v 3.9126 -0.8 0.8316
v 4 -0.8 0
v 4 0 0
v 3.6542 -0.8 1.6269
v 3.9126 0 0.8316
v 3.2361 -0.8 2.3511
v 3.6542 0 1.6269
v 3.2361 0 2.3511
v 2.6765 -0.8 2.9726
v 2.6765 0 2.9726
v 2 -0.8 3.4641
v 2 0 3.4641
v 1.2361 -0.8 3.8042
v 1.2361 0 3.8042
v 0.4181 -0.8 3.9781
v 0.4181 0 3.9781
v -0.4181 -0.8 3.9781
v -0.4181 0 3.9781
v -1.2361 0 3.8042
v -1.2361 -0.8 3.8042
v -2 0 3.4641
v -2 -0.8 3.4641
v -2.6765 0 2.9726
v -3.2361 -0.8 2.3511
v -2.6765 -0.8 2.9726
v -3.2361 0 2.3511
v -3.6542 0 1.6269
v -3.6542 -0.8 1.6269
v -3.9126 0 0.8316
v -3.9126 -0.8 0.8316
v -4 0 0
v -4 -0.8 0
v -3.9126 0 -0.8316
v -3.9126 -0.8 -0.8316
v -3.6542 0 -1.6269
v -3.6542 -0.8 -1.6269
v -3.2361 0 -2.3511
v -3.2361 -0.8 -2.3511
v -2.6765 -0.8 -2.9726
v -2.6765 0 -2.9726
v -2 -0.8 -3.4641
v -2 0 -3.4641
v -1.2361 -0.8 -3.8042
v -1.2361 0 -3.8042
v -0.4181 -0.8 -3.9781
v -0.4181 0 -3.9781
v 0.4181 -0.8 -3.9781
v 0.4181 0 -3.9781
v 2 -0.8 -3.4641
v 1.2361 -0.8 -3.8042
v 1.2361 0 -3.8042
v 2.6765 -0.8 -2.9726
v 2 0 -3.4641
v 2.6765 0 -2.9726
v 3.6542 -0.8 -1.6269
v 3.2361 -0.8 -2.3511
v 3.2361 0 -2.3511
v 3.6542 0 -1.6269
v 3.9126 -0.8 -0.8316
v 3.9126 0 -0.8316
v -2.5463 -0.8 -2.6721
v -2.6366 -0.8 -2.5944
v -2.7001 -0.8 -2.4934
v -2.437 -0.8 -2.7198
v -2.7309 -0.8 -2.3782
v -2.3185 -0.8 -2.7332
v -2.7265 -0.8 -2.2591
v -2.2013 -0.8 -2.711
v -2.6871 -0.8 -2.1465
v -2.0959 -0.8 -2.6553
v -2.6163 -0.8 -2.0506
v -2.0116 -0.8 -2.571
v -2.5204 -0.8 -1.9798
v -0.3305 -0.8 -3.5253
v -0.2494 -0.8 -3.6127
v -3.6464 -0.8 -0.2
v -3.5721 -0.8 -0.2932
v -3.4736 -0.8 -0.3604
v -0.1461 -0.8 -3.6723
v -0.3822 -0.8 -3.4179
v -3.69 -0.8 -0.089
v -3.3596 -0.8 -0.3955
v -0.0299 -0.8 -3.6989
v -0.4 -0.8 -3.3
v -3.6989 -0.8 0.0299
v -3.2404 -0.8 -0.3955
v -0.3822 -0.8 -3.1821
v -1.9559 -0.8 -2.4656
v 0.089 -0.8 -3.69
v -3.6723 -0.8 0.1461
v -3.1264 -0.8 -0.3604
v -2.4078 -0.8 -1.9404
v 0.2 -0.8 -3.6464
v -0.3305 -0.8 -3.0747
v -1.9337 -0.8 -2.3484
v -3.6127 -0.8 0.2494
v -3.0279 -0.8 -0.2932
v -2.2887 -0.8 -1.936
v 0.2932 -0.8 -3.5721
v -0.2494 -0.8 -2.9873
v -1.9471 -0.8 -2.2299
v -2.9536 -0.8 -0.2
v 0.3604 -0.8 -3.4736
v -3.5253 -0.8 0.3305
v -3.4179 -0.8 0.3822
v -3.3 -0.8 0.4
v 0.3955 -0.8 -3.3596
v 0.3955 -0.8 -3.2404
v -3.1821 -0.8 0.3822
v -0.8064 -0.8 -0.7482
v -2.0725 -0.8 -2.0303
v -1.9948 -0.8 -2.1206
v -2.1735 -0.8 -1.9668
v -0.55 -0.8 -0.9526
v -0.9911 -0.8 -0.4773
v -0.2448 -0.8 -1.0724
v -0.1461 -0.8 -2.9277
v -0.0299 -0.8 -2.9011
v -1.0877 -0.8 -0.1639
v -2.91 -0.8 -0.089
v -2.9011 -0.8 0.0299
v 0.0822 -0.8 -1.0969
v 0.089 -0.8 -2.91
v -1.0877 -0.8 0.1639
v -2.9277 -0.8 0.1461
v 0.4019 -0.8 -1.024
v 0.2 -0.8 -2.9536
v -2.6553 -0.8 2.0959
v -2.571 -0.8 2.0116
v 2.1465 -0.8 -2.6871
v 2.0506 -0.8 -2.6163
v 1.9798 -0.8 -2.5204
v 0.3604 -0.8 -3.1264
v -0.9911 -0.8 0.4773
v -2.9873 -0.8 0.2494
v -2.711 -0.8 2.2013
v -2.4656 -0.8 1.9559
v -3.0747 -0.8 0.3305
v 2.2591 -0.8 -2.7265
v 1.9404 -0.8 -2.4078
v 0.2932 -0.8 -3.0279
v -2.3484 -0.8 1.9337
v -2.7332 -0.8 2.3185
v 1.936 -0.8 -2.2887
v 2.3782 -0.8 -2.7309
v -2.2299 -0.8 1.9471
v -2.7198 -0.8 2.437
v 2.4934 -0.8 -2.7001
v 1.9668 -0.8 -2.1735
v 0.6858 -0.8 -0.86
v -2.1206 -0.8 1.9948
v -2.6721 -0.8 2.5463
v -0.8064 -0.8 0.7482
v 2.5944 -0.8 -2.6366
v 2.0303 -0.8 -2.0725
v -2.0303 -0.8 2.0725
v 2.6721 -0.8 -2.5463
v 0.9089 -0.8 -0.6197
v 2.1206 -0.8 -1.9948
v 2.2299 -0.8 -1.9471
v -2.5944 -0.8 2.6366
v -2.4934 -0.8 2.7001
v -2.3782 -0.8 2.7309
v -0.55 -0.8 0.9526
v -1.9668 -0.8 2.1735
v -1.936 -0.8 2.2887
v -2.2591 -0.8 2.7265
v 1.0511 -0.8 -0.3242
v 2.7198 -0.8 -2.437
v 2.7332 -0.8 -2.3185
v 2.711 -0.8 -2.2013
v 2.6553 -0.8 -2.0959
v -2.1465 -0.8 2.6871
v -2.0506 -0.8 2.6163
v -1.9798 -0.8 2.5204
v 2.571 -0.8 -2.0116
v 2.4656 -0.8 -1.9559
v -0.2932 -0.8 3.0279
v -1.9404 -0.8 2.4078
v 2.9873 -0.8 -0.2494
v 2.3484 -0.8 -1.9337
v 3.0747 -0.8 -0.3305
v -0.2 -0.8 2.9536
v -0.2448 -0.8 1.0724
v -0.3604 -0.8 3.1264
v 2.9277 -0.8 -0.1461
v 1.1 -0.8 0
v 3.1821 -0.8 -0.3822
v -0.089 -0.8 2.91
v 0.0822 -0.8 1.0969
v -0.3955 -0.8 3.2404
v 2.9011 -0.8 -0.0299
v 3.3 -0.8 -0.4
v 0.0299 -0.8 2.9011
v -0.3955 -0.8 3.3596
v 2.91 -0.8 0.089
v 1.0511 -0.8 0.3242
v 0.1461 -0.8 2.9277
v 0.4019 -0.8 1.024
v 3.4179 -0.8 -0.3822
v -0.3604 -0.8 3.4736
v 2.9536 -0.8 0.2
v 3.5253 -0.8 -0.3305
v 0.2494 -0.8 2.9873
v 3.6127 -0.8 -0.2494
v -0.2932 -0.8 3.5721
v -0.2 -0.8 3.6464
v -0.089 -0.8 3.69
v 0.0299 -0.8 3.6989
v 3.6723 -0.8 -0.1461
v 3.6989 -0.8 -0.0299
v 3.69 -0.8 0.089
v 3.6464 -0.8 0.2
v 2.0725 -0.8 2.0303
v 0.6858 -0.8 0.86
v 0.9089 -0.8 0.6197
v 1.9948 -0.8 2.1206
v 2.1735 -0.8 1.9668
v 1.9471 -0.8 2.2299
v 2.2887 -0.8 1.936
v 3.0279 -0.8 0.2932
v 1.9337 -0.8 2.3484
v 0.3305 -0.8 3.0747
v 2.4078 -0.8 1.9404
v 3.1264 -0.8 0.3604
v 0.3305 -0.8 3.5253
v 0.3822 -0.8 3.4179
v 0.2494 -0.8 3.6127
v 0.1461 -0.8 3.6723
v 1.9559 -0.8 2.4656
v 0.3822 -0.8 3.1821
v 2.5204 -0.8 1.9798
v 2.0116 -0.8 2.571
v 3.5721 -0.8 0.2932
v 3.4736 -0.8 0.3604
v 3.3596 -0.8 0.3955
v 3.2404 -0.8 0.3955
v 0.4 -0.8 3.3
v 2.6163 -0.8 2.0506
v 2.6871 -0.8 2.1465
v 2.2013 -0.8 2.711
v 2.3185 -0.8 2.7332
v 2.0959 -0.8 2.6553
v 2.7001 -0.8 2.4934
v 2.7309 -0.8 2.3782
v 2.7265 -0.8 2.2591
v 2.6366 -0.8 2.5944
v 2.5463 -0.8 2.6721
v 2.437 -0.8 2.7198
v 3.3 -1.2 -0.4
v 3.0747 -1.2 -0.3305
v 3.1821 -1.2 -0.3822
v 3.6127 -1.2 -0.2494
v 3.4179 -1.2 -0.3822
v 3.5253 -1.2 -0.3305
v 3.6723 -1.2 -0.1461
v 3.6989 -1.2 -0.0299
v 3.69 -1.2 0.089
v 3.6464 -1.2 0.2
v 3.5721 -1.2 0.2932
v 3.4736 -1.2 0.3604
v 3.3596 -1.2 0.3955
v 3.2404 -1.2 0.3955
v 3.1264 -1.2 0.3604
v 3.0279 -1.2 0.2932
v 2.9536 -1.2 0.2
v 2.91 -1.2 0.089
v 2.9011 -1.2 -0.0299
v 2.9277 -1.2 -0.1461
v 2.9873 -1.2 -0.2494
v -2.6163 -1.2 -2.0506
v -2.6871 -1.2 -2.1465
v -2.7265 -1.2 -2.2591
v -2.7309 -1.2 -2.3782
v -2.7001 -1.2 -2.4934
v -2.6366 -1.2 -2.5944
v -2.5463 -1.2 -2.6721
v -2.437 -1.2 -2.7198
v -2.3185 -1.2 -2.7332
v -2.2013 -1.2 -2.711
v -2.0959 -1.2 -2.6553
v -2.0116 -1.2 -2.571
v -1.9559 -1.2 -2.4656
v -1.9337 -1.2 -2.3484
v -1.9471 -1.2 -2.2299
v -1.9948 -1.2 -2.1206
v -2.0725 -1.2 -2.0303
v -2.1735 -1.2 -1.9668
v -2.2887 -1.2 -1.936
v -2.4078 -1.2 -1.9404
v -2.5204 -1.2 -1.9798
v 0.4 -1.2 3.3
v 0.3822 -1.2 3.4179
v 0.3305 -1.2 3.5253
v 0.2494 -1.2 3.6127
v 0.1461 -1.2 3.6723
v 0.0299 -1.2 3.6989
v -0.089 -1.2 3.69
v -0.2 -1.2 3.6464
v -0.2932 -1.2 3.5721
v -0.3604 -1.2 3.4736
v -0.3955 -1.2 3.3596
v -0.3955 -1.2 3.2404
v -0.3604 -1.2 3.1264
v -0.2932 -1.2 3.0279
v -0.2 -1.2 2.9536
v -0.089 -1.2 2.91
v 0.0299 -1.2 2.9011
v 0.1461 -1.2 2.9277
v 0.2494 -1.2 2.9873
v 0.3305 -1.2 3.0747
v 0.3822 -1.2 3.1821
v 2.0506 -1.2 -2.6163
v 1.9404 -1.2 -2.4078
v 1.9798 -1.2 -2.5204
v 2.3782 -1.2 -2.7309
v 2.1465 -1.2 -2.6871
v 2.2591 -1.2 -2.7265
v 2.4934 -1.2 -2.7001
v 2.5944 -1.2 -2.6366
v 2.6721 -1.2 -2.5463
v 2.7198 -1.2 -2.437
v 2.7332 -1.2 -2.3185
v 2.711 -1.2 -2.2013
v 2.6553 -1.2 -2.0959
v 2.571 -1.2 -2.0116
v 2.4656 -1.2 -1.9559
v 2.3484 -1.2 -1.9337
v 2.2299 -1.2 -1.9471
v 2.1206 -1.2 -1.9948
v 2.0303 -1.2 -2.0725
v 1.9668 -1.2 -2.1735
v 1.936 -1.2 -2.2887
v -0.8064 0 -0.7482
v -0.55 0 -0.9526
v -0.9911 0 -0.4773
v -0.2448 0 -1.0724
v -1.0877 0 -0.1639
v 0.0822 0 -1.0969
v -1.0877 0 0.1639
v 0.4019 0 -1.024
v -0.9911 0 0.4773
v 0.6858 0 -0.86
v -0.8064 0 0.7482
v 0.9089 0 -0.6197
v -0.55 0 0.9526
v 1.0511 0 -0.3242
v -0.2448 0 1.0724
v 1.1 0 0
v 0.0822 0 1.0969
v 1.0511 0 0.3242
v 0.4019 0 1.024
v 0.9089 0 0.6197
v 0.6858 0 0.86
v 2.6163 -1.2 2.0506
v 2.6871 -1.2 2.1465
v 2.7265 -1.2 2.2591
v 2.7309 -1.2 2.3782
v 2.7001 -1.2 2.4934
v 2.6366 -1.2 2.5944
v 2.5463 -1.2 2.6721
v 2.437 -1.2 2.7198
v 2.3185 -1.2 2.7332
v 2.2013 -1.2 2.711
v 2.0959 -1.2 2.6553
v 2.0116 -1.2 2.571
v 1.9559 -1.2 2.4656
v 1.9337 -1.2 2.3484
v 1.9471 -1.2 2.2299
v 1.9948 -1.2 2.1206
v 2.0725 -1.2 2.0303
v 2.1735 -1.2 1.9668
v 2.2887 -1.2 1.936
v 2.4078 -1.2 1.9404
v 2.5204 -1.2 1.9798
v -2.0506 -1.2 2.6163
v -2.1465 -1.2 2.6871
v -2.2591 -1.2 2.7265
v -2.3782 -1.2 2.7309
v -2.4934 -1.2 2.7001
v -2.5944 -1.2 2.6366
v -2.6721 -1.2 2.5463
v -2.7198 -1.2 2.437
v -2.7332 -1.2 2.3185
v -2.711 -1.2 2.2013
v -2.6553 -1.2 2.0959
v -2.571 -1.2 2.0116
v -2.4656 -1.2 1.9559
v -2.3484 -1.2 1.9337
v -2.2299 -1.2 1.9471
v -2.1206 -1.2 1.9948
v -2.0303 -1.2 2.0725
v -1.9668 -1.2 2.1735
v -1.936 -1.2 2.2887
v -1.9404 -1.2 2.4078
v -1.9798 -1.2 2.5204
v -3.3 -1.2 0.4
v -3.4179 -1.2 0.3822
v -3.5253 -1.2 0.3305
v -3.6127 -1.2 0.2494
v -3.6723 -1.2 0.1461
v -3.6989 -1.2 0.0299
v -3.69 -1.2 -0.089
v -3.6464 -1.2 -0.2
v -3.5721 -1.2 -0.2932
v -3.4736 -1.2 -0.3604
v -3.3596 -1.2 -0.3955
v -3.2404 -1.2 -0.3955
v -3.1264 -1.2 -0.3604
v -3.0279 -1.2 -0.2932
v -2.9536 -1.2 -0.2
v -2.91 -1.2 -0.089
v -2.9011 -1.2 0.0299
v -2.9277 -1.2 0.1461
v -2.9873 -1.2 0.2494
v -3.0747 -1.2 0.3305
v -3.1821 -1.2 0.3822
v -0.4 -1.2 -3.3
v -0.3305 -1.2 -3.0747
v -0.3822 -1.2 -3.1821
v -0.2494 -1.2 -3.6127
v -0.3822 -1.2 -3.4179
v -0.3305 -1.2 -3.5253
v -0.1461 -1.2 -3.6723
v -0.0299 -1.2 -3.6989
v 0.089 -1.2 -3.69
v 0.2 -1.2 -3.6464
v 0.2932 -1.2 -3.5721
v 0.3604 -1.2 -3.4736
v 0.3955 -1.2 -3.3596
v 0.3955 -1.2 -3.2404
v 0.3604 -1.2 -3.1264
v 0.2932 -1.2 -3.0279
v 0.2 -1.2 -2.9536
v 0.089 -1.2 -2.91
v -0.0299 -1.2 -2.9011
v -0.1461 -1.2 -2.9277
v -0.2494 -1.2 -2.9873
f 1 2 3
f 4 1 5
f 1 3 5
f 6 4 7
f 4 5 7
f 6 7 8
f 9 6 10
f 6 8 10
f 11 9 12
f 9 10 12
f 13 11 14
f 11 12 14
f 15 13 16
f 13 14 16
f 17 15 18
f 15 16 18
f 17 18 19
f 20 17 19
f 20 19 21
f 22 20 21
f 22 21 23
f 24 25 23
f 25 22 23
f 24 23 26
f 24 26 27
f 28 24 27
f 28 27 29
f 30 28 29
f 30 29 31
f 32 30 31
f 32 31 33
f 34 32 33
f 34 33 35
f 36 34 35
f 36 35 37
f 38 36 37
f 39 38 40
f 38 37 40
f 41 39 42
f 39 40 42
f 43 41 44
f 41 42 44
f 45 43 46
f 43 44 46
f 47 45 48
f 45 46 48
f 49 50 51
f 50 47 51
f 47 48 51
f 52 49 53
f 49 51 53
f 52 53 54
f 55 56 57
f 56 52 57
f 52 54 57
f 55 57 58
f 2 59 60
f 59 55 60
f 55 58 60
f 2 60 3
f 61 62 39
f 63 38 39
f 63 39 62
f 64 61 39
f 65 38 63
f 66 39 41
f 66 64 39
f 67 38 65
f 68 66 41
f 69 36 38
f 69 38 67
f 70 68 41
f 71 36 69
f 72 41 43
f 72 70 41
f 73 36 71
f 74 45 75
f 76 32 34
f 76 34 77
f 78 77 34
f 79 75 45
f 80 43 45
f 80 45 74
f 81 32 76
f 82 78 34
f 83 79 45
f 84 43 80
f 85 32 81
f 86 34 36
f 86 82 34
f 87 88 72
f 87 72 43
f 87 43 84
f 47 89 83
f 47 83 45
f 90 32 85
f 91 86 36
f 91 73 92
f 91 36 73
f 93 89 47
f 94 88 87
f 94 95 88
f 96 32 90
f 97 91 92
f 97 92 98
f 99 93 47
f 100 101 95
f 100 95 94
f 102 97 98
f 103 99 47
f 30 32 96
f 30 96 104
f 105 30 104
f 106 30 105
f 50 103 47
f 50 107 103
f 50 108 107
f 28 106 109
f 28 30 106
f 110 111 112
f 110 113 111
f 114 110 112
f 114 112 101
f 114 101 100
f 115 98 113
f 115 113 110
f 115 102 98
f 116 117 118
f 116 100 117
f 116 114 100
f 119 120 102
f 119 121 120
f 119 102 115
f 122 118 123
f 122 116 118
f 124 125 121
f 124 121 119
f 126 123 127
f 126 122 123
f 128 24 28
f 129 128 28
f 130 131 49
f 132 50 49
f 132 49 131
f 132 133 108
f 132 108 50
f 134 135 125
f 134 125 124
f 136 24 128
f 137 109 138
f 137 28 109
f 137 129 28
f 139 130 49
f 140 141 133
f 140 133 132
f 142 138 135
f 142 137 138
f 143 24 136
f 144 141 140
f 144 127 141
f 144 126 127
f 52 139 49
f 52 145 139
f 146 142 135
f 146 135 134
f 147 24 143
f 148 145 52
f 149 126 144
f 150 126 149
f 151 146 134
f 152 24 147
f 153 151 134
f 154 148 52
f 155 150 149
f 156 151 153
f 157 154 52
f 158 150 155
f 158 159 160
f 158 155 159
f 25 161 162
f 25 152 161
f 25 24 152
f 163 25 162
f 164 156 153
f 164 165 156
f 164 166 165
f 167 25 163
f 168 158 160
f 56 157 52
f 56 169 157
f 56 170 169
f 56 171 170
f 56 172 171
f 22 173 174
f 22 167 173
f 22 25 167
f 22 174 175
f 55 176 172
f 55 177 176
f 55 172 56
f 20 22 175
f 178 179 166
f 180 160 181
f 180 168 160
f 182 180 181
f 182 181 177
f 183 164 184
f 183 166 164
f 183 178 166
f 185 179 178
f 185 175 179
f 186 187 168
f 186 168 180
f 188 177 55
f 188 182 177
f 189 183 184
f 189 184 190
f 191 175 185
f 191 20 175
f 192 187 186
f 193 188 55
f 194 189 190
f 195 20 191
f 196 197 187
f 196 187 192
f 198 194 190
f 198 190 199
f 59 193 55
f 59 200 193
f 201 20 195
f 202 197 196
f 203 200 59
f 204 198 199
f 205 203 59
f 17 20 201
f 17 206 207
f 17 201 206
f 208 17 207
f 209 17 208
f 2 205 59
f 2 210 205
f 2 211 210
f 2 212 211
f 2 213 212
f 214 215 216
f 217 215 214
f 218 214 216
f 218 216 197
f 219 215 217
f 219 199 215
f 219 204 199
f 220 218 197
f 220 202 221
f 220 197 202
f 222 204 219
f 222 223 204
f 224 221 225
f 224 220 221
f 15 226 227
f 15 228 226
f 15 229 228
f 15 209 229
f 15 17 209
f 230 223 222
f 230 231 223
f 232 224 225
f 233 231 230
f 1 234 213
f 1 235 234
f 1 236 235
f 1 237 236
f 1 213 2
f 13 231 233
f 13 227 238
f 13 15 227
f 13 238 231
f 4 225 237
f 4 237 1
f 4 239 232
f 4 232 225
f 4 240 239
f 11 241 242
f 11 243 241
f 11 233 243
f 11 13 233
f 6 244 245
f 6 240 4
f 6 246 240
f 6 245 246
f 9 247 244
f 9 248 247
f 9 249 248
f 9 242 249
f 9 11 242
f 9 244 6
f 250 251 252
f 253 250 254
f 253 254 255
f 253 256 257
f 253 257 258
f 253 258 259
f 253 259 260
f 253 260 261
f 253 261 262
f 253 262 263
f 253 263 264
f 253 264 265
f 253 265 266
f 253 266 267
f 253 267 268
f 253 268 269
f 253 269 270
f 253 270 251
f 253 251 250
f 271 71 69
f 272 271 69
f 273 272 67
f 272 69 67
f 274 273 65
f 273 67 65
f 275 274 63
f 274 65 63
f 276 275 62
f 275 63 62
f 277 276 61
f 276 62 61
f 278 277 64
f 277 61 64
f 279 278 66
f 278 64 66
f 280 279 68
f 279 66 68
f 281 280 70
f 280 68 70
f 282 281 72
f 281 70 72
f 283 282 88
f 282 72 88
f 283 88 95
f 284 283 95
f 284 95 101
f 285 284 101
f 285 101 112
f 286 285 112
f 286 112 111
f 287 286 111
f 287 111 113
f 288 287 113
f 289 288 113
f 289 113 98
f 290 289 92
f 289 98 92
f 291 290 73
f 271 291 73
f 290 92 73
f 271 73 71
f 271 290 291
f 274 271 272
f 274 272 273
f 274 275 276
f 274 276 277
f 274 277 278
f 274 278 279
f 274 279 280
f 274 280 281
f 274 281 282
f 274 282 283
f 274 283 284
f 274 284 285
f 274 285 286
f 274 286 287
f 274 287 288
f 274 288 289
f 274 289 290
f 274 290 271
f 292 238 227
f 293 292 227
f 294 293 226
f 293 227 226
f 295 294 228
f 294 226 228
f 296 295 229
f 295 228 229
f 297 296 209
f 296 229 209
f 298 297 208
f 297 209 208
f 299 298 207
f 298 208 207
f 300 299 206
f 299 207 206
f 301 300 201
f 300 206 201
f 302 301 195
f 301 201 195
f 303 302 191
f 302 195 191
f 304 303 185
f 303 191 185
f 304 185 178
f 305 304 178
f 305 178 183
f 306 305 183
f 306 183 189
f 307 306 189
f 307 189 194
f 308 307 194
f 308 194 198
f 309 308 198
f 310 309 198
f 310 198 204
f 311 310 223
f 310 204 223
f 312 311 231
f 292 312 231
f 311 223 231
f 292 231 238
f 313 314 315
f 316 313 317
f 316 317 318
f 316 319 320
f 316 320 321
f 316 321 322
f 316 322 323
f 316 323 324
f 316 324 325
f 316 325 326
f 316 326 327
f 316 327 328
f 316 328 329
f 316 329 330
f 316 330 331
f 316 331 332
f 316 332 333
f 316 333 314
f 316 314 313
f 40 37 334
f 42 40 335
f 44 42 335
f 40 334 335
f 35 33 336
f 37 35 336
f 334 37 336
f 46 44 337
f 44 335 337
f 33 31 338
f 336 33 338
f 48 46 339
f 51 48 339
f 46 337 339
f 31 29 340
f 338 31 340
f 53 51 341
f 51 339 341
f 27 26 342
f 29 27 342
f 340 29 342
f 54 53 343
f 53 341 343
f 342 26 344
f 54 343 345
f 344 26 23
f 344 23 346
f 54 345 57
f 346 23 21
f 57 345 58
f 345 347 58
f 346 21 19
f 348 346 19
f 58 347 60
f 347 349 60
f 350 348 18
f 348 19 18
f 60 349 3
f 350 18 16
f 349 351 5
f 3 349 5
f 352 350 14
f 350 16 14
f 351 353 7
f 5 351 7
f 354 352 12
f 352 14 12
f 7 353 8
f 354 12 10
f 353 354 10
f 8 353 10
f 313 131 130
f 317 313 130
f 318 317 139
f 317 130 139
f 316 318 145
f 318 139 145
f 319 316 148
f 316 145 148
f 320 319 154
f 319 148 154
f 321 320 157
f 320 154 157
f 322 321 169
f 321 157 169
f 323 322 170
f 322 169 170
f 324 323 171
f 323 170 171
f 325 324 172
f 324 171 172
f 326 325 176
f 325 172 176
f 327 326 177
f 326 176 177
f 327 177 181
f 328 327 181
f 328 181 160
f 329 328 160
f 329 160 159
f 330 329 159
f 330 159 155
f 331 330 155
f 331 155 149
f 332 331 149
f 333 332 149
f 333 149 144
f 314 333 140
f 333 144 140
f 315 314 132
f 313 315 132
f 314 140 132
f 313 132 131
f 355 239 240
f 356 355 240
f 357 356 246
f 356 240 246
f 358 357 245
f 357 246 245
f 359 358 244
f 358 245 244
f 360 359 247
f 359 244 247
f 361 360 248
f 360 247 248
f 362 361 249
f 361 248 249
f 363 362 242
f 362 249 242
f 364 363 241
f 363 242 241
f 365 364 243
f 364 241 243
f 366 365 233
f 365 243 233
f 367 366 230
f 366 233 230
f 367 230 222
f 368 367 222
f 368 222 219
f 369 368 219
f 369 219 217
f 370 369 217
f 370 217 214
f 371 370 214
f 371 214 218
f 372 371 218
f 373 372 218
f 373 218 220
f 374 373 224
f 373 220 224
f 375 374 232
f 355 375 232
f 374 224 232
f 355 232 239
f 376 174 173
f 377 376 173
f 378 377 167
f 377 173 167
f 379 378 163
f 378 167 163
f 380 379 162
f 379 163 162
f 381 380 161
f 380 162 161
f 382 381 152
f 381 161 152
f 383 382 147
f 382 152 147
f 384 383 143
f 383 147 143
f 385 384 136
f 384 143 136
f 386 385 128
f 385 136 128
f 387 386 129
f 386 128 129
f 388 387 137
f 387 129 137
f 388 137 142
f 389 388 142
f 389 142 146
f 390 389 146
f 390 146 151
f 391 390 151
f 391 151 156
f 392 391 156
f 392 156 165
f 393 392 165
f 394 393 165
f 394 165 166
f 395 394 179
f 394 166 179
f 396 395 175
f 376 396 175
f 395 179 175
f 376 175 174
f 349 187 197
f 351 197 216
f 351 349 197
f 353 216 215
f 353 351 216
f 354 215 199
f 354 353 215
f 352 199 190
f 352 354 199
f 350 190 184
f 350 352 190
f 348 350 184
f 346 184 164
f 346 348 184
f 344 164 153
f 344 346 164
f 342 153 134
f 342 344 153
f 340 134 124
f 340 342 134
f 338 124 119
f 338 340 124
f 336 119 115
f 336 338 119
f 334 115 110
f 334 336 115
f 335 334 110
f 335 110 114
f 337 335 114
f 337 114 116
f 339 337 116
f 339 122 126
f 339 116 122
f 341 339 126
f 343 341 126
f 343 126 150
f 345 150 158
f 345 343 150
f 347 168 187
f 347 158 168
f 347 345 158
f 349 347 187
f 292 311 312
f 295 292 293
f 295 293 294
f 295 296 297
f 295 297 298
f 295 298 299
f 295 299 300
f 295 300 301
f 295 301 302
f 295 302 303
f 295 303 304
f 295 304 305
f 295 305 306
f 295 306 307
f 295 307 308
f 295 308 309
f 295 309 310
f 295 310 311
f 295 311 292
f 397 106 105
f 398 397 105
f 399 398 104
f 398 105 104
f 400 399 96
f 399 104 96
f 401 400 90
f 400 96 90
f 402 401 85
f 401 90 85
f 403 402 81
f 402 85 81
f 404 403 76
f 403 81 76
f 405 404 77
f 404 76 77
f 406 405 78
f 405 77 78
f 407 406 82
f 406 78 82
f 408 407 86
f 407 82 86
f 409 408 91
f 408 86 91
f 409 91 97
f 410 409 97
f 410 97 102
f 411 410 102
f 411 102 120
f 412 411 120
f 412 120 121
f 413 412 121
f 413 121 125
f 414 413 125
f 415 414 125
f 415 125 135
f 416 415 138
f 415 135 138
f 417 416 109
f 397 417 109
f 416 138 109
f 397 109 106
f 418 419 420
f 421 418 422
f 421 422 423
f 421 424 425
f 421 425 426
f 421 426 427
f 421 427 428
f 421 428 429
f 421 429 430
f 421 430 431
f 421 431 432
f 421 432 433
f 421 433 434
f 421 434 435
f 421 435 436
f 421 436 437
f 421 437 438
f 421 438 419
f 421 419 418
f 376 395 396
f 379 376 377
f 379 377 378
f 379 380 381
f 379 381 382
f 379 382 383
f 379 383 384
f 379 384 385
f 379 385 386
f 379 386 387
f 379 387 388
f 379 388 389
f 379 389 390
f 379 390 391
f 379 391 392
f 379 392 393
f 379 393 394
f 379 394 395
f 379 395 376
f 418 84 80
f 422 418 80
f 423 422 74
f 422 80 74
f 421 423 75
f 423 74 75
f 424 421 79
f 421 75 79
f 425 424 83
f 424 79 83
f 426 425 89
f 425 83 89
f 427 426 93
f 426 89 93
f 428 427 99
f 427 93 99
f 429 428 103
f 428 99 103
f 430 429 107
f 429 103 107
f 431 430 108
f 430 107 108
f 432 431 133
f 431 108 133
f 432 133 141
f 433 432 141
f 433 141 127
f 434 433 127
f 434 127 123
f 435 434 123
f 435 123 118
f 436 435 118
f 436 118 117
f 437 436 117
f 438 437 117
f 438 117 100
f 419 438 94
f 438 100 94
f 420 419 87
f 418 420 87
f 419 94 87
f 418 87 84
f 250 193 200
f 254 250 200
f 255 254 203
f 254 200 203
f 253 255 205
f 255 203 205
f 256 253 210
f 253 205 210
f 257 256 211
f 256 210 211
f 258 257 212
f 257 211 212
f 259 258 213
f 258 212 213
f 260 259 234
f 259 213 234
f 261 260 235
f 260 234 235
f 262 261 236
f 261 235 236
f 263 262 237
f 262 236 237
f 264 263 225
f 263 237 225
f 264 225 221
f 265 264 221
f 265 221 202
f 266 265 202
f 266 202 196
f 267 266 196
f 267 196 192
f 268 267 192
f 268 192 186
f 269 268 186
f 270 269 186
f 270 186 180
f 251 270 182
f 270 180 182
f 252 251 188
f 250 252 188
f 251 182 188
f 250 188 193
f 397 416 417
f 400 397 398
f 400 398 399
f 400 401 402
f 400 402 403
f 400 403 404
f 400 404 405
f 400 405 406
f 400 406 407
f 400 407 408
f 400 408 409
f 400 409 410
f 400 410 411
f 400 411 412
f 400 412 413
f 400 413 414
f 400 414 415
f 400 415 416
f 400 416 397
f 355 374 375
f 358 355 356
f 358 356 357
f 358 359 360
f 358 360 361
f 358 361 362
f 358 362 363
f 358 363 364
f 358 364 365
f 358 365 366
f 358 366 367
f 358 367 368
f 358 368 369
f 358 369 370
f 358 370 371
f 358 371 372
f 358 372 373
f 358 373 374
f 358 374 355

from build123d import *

# Parameters (mm, degrees)
F0_R     = 4
F0_R_2   = 1.1
F1_DEPTH = 0.8
F2_R     = 0.4
F3_DEPTH = 0.4
F4_COUNT = 8


with BuildPart() as f1:
    # F0 (on Front) → F1 (new body)
    with BuildSketch(Plane.XZ):
        Circle(F0_R)
        Circle(F0_R_2, mode=Mode.SUBTRACT)
    extrude(amount=F1_DEPTH)

    # F2 (on face) → F3 (join)
    with BuildSketch(Plane.XZ.offset(0.8)):
        with Locations((0, 3.3)):
            Circle(F2_R)
    extrude(amount=F3_DEPTH)

    # F4: F1 ×8 about axis
    f4_axis = Axis((0, -0.8, 0), (0, -1, 0))


with BuildPart() as f1_1:
    add(f1.part)
    for i in range(1, F4_COUNT):
        add(f1.part.rotate(f4_axis, i * 360 / F4_COUNT))


solid = f1_1.part
